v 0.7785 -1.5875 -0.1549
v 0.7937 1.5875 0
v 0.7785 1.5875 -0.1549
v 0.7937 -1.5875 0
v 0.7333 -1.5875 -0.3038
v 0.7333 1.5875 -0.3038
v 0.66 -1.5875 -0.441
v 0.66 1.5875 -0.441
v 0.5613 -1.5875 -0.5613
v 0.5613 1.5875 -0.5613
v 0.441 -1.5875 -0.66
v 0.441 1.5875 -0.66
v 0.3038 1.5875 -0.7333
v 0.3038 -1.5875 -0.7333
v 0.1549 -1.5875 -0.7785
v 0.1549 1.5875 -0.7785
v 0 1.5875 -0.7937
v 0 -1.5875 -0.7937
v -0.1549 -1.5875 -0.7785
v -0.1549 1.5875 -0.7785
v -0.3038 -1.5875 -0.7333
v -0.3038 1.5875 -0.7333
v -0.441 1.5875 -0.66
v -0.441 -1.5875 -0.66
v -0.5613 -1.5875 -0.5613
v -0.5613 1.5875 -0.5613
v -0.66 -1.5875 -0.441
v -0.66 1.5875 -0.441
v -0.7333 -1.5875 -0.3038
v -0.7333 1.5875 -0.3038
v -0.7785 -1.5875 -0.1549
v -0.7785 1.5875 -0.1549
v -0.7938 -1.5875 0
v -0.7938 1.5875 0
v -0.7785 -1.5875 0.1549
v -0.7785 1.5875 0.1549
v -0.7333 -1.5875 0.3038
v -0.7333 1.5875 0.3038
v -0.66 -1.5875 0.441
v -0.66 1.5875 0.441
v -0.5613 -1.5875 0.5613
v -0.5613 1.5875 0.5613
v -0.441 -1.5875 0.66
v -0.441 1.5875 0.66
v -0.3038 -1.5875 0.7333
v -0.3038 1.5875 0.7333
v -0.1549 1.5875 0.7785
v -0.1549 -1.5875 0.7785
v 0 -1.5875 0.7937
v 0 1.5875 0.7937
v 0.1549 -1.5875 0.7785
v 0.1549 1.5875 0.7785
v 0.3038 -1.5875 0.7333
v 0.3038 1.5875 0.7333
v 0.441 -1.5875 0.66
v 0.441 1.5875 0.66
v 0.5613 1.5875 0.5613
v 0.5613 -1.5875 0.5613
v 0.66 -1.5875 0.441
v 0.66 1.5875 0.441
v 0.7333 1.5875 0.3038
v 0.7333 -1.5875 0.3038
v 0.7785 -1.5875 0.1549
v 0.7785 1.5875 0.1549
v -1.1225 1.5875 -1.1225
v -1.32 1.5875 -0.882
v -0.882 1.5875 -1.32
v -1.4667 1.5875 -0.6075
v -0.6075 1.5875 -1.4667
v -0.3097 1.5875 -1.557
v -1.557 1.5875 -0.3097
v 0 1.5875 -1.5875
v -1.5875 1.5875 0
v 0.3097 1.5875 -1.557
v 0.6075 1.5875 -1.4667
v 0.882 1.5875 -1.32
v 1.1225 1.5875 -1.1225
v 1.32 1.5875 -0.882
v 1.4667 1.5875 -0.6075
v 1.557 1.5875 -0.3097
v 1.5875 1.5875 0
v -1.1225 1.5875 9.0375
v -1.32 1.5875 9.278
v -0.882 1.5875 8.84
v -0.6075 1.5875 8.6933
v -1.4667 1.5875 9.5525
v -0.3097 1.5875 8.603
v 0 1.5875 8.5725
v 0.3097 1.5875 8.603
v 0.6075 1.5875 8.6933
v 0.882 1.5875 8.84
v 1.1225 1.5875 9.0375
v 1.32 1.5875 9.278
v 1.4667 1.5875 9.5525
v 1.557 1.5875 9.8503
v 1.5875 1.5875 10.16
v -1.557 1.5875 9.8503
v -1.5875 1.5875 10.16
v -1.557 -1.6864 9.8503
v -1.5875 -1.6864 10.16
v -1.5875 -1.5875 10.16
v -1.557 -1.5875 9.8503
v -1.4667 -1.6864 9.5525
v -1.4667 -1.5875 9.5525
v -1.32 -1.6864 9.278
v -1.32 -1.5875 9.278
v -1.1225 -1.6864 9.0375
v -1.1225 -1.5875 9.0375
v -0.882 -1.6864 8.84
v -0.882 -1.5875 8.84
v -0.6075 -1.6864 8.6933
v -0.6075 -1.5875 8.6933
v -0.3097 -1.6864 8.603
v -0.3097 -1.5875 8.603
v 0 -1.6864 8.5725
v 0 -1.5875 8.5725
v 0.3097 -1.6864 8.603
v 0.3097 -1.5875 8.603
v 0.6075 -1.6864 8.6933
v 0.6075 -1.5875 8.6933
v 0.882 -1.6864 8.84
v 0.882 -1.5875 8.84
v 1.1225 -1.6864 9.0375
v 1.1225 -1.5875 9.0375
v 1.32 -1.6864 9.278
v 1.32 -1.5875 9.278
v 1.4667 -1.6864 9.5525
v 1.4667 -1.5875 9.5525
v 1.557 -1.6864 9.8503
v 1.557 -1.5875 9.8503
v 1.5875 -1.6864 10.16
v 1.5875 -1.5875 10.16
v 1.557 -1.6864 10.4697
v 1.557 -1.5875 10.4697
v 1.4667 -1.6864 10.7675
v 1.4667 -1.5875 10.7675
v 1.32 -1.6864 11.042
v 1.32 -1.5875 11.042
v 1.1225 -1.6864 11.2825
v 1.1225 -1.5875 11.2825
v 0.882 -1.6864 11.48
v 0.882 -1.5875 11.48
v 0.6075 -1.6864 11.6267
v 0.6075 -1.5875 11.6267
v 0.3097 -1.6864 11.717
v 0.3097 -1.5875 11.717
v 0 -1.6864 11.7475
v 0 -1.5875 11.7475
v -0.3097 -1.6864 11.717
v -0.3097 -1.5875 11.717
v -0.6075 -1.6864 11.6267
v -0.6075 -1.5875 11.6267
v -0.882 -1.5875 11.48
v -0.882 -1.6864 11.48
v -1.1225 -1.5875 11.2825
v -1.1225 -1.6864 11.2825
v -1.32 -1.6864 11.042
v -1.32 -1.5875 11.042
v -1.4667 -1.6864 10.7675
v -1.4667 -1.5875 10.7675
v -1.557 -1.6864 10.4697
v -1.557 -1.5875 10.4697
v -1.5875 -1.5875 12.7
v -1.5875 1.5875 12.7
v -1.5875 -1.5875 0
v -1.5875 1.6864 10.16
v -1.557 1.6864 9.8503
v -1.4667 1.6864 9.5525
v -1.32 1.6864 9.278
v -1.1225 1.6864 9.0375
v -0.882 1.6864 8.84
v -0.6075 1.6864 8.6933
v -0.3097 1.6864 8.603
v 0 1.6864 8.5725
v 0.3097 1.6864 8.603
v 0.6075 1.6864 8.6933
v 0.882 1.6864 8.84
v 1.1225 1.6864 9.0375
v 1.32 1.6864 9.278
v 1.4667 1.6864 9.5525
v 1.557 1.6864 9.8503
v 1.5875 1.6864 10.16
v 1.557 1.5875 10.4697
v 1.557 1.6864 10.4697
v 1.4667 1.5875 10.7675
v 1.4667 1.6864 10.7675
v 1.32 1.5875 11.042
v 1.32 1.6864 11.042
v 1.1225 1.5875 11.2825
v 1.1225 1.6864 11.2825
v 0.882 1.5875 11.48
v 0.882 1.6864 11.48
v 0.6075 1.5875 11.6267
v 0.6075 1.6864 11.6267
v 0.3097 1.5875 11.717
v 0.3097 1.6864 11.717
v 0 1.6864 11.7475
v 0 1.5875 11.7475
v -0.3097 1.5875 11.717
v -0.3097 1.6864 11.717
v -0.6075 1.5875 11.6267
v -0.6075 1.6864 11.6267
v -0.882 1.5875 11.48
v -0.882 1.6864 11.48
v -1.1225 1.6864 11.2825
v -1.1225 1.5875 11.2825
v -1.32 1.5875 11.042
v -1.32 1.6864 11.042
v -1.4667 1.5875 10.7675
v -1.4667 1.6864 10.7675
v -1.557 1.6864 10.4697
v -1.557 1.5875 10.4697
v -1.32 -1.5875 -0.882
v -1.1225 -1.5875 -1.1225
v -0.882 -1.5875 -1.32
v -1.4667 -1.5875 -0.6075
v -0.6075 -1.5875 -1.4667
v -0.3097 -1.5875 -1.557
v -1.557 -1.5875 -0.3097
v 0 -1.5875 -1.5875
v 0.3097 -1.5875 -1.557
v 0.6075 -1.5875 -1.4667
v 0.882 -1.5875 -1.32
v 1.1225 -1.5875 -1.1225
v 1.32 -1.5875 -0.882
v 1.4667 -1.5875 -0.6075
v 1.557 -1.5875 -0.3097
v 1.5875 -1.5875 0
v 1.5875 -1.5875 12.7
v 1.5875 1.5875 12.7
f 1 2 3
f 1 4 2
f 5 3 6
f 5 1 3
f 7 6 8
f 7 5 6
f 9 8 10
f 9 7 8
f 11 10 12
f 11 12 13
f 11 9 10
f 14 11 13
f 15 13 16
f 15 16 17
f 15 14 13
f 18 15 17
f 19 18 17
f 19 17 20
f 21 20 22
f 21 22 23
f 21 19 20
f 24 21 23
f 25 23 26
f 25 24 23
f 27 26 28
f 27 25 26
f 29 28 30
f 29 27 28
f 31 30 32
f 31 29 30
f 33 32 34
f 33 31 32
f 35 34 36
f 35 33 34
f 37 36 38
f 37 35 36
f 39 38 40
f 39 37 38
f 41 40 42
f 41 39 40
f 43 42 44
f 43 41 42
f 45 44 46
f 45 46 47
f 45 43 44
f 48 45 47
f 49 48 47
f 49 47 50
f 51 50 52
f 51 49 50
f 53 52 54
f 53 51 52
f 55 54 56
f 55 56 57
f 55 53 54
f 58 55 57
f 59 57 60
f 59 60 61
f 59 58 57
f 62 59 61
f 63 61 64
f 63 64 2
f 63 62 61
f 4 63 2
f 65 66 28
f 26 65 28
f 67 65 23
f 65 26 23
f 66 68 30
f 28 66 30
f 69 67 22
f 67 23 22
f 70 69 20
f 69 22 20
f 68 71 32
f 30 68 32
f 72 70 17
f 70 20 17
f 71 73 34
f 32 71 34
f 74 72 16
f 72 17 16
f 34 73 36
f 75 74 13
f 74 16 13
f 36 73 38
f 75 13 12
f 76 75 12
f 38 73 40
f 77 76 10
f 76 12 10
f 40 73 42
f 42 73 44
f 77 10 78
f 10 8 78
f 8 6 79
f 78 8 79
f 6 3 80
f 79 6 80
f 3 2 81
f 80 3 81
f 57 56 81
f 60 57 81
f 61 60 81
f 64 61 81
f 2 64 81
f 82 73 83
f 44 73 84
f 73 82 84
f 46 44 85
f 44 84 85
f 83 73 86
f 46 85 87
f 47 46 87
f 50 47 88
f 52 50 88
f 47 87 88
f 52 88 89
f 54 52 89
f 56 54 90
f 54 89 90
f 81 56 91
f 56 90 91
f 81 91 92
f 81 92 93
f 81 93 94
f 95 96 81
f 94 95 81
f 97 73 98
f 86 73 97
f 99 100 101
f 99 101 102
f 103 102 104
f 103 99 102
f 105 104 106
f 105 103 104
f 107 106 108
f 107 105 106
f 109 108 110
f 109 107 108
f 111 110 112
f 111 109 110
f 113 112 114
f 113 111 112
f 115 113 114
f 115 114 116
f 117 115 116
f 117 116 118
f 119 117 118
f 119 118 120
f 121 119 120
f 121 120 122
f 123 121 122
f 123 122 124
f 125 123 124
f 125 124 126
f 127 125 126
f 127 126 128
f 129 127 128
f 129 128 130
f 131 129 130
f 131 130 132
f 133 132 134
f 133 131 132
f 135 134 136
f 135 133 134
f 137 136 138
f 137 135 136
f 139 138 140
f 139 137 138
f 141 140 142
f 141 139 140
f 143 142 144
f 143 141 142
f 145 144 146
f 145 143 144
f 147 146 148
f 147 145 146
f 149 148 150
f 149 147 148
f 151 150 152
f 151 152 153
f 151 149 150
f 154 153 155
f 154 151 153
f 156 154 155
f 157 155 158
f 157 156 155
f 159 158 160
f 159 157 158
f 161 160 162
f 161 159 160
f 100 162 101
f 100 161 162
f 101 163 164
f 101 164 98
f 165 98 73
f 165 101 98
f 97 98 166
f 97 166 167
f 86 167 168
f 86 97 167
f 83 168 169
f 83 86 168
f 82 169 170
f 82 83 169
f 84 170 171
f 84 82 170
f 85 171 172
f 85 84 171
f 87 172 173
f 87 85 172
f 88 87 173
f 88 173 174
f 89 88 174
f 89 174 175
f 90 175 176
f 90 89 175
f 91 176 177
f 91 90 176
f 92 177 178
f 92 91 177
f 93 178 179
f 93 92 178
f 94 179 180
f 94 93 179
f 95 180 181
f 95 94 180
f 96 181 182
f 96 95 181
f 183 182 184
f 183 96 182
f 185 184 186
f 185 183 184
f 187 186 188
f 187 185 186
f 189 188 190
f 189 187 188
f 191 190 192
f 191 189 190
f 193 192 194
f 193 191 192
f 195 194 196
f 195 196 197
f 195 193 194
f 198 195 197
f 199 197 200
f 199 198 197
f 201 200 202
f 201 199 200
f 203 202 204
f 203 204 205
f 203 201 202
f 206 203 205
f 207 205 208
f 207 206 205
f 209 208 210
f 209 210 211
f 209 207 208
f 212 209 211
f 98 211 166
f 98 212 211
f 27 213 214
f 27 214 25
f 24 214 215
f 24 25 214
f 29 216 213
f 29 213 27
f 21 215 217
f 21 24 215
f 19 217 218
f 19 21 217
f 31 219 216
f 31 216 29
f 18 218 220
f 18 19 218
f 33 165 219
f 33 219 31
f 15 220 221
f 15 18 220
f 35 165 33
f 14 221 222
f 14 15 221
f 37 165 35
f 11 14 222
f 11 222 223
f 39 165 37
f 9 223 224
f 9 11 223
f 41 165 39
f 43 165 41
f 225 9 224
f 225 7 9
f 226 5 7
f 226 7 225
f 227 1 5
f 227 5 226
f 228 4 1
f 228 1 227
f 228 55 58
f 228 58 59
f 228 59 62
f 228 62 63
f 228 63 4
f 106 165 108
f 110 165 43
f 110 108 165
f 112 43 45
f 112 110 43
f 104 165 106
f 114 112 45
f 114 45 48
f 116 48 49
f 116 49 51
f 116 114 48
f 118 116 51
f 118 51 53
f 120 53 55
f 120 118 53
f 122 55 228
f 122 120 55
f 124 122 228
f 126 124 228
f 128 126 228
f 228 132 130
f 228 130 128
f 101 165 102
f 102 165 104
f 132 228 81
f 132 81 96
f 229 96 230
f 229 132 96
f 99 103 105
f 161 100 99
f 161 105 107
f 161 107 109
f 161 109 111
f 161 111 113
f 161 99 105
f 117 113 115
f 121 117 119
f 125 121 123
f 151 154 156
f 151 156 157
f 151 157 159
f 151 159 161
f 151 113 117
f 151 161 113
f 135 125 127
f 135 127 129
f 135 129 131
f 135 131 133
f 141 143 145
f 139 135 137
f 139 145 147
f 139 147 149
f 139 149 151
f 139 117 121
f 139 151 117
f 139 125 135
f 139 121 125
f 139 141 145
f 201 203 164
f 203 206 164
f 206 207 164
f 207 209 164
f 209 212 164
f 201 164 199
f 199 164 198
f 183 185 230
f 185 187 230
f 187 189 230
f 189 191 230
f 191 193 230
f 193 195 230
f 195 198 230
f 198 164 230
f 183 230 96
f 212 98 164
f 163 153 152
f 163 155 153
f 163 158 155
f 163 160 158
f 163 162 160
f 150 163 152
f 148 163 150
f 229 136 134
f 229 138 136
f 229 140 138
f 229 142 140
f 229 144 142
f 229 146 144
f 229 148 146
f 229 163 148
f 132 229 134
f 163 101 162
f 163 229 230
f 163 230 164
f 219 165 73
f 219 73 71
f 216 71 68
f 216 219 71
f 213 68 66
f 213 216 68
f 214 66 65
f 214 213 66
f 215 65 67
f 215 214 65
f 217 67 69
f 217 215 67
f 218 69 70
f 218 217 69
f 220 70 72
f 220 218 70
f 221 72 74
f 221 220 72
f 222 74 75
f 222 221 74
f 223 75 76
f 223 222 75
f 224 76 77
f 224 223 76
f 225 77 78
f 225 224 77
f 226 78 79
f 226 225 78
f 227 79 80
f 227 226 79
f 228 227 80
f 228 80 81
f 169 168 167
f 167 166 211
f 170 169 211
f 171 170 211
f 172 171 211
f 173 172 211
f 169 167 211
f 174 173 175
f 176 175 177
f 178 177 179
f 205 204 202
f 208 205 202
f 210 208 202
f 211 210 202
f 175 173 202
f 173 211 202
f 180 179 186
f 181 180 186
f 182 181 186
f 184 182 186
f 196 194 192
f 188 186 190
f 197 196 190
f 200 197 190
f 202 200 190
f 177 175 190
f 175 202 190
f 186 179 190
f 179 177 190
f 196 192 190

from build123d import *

# Parameters (mm, degrees)
F1_DEPTH = 1.5875
F2_DEPTH = 1.6863590572


with BuildPart() as f1:
    # F0 (on Front) → F1 (new body, symmetric)
    with BuildSketch(Plane.XZ):
        with BuildLine():
            Line((-1.5875, 10.16), (-1.5875, 0))
            Line((-1.5875, 0), (-0.79375, 0))
            ThreePointArc((-0.79375, 0), (0, 0.79375), (0.79375, 0))
            Line((0.79375, 0), (1.5875, 0))
            Line((1.5875, 0), (1.5875, 10.16))
            ThreePointArc((1.5875, 10.16), (0, 8.5725), (-1.5875, 10.16))
        make_face()
        with BuildLine():
            ThreePointArc((1.5875, 10.16), (0, 11.7475), (-1.5875, 10.16))
            ThreePointArc((-1.5875, 10.16), (0, 8.5725), (1.5875, 10.16))
        make_face()
        with BuildLine():
            Line((-1.5875, 12.7), (-1.5875, 10.16))
            ThreePointArc((-1.5875, 10.16), (0, 11.7475), (1.5875, 10.16))
            Line((1.5875, 10.16), (1.5875, 12.7))
            Line((1.5875, 12.7), (-1.5875, 12.7))
        make_face()
        with BuildLine():
            Line((-0.79375, 0), (-1.5875, 0))
            ThreePointArc((-1.5875, 0), (0, -1.5875), (1.5875, 0))
            Line((1.5875, 0), (0.79375, 0))
            ThreePointArc((0.79375, 0), (0, -0.79375), (-0.79375, 0))
        make_face()
    extrude(amount=F1_DEPTH, both=True)

    # F0 (on Front) → F2 (join, symmetric)
    with BuildSketch(Plane.XZ):
        with BuildLine():
            ThreePointArc((1.5875, 10.16), (0, 11.7475), (-1.5875, 10.16))
            ThreePointArc((-1.5875, 10.16), (0, 8.5725), (1.5875, 10.16))
        make_face()
    extrude(amount=F2_DEPTH, both=True)


solid = f1.part
